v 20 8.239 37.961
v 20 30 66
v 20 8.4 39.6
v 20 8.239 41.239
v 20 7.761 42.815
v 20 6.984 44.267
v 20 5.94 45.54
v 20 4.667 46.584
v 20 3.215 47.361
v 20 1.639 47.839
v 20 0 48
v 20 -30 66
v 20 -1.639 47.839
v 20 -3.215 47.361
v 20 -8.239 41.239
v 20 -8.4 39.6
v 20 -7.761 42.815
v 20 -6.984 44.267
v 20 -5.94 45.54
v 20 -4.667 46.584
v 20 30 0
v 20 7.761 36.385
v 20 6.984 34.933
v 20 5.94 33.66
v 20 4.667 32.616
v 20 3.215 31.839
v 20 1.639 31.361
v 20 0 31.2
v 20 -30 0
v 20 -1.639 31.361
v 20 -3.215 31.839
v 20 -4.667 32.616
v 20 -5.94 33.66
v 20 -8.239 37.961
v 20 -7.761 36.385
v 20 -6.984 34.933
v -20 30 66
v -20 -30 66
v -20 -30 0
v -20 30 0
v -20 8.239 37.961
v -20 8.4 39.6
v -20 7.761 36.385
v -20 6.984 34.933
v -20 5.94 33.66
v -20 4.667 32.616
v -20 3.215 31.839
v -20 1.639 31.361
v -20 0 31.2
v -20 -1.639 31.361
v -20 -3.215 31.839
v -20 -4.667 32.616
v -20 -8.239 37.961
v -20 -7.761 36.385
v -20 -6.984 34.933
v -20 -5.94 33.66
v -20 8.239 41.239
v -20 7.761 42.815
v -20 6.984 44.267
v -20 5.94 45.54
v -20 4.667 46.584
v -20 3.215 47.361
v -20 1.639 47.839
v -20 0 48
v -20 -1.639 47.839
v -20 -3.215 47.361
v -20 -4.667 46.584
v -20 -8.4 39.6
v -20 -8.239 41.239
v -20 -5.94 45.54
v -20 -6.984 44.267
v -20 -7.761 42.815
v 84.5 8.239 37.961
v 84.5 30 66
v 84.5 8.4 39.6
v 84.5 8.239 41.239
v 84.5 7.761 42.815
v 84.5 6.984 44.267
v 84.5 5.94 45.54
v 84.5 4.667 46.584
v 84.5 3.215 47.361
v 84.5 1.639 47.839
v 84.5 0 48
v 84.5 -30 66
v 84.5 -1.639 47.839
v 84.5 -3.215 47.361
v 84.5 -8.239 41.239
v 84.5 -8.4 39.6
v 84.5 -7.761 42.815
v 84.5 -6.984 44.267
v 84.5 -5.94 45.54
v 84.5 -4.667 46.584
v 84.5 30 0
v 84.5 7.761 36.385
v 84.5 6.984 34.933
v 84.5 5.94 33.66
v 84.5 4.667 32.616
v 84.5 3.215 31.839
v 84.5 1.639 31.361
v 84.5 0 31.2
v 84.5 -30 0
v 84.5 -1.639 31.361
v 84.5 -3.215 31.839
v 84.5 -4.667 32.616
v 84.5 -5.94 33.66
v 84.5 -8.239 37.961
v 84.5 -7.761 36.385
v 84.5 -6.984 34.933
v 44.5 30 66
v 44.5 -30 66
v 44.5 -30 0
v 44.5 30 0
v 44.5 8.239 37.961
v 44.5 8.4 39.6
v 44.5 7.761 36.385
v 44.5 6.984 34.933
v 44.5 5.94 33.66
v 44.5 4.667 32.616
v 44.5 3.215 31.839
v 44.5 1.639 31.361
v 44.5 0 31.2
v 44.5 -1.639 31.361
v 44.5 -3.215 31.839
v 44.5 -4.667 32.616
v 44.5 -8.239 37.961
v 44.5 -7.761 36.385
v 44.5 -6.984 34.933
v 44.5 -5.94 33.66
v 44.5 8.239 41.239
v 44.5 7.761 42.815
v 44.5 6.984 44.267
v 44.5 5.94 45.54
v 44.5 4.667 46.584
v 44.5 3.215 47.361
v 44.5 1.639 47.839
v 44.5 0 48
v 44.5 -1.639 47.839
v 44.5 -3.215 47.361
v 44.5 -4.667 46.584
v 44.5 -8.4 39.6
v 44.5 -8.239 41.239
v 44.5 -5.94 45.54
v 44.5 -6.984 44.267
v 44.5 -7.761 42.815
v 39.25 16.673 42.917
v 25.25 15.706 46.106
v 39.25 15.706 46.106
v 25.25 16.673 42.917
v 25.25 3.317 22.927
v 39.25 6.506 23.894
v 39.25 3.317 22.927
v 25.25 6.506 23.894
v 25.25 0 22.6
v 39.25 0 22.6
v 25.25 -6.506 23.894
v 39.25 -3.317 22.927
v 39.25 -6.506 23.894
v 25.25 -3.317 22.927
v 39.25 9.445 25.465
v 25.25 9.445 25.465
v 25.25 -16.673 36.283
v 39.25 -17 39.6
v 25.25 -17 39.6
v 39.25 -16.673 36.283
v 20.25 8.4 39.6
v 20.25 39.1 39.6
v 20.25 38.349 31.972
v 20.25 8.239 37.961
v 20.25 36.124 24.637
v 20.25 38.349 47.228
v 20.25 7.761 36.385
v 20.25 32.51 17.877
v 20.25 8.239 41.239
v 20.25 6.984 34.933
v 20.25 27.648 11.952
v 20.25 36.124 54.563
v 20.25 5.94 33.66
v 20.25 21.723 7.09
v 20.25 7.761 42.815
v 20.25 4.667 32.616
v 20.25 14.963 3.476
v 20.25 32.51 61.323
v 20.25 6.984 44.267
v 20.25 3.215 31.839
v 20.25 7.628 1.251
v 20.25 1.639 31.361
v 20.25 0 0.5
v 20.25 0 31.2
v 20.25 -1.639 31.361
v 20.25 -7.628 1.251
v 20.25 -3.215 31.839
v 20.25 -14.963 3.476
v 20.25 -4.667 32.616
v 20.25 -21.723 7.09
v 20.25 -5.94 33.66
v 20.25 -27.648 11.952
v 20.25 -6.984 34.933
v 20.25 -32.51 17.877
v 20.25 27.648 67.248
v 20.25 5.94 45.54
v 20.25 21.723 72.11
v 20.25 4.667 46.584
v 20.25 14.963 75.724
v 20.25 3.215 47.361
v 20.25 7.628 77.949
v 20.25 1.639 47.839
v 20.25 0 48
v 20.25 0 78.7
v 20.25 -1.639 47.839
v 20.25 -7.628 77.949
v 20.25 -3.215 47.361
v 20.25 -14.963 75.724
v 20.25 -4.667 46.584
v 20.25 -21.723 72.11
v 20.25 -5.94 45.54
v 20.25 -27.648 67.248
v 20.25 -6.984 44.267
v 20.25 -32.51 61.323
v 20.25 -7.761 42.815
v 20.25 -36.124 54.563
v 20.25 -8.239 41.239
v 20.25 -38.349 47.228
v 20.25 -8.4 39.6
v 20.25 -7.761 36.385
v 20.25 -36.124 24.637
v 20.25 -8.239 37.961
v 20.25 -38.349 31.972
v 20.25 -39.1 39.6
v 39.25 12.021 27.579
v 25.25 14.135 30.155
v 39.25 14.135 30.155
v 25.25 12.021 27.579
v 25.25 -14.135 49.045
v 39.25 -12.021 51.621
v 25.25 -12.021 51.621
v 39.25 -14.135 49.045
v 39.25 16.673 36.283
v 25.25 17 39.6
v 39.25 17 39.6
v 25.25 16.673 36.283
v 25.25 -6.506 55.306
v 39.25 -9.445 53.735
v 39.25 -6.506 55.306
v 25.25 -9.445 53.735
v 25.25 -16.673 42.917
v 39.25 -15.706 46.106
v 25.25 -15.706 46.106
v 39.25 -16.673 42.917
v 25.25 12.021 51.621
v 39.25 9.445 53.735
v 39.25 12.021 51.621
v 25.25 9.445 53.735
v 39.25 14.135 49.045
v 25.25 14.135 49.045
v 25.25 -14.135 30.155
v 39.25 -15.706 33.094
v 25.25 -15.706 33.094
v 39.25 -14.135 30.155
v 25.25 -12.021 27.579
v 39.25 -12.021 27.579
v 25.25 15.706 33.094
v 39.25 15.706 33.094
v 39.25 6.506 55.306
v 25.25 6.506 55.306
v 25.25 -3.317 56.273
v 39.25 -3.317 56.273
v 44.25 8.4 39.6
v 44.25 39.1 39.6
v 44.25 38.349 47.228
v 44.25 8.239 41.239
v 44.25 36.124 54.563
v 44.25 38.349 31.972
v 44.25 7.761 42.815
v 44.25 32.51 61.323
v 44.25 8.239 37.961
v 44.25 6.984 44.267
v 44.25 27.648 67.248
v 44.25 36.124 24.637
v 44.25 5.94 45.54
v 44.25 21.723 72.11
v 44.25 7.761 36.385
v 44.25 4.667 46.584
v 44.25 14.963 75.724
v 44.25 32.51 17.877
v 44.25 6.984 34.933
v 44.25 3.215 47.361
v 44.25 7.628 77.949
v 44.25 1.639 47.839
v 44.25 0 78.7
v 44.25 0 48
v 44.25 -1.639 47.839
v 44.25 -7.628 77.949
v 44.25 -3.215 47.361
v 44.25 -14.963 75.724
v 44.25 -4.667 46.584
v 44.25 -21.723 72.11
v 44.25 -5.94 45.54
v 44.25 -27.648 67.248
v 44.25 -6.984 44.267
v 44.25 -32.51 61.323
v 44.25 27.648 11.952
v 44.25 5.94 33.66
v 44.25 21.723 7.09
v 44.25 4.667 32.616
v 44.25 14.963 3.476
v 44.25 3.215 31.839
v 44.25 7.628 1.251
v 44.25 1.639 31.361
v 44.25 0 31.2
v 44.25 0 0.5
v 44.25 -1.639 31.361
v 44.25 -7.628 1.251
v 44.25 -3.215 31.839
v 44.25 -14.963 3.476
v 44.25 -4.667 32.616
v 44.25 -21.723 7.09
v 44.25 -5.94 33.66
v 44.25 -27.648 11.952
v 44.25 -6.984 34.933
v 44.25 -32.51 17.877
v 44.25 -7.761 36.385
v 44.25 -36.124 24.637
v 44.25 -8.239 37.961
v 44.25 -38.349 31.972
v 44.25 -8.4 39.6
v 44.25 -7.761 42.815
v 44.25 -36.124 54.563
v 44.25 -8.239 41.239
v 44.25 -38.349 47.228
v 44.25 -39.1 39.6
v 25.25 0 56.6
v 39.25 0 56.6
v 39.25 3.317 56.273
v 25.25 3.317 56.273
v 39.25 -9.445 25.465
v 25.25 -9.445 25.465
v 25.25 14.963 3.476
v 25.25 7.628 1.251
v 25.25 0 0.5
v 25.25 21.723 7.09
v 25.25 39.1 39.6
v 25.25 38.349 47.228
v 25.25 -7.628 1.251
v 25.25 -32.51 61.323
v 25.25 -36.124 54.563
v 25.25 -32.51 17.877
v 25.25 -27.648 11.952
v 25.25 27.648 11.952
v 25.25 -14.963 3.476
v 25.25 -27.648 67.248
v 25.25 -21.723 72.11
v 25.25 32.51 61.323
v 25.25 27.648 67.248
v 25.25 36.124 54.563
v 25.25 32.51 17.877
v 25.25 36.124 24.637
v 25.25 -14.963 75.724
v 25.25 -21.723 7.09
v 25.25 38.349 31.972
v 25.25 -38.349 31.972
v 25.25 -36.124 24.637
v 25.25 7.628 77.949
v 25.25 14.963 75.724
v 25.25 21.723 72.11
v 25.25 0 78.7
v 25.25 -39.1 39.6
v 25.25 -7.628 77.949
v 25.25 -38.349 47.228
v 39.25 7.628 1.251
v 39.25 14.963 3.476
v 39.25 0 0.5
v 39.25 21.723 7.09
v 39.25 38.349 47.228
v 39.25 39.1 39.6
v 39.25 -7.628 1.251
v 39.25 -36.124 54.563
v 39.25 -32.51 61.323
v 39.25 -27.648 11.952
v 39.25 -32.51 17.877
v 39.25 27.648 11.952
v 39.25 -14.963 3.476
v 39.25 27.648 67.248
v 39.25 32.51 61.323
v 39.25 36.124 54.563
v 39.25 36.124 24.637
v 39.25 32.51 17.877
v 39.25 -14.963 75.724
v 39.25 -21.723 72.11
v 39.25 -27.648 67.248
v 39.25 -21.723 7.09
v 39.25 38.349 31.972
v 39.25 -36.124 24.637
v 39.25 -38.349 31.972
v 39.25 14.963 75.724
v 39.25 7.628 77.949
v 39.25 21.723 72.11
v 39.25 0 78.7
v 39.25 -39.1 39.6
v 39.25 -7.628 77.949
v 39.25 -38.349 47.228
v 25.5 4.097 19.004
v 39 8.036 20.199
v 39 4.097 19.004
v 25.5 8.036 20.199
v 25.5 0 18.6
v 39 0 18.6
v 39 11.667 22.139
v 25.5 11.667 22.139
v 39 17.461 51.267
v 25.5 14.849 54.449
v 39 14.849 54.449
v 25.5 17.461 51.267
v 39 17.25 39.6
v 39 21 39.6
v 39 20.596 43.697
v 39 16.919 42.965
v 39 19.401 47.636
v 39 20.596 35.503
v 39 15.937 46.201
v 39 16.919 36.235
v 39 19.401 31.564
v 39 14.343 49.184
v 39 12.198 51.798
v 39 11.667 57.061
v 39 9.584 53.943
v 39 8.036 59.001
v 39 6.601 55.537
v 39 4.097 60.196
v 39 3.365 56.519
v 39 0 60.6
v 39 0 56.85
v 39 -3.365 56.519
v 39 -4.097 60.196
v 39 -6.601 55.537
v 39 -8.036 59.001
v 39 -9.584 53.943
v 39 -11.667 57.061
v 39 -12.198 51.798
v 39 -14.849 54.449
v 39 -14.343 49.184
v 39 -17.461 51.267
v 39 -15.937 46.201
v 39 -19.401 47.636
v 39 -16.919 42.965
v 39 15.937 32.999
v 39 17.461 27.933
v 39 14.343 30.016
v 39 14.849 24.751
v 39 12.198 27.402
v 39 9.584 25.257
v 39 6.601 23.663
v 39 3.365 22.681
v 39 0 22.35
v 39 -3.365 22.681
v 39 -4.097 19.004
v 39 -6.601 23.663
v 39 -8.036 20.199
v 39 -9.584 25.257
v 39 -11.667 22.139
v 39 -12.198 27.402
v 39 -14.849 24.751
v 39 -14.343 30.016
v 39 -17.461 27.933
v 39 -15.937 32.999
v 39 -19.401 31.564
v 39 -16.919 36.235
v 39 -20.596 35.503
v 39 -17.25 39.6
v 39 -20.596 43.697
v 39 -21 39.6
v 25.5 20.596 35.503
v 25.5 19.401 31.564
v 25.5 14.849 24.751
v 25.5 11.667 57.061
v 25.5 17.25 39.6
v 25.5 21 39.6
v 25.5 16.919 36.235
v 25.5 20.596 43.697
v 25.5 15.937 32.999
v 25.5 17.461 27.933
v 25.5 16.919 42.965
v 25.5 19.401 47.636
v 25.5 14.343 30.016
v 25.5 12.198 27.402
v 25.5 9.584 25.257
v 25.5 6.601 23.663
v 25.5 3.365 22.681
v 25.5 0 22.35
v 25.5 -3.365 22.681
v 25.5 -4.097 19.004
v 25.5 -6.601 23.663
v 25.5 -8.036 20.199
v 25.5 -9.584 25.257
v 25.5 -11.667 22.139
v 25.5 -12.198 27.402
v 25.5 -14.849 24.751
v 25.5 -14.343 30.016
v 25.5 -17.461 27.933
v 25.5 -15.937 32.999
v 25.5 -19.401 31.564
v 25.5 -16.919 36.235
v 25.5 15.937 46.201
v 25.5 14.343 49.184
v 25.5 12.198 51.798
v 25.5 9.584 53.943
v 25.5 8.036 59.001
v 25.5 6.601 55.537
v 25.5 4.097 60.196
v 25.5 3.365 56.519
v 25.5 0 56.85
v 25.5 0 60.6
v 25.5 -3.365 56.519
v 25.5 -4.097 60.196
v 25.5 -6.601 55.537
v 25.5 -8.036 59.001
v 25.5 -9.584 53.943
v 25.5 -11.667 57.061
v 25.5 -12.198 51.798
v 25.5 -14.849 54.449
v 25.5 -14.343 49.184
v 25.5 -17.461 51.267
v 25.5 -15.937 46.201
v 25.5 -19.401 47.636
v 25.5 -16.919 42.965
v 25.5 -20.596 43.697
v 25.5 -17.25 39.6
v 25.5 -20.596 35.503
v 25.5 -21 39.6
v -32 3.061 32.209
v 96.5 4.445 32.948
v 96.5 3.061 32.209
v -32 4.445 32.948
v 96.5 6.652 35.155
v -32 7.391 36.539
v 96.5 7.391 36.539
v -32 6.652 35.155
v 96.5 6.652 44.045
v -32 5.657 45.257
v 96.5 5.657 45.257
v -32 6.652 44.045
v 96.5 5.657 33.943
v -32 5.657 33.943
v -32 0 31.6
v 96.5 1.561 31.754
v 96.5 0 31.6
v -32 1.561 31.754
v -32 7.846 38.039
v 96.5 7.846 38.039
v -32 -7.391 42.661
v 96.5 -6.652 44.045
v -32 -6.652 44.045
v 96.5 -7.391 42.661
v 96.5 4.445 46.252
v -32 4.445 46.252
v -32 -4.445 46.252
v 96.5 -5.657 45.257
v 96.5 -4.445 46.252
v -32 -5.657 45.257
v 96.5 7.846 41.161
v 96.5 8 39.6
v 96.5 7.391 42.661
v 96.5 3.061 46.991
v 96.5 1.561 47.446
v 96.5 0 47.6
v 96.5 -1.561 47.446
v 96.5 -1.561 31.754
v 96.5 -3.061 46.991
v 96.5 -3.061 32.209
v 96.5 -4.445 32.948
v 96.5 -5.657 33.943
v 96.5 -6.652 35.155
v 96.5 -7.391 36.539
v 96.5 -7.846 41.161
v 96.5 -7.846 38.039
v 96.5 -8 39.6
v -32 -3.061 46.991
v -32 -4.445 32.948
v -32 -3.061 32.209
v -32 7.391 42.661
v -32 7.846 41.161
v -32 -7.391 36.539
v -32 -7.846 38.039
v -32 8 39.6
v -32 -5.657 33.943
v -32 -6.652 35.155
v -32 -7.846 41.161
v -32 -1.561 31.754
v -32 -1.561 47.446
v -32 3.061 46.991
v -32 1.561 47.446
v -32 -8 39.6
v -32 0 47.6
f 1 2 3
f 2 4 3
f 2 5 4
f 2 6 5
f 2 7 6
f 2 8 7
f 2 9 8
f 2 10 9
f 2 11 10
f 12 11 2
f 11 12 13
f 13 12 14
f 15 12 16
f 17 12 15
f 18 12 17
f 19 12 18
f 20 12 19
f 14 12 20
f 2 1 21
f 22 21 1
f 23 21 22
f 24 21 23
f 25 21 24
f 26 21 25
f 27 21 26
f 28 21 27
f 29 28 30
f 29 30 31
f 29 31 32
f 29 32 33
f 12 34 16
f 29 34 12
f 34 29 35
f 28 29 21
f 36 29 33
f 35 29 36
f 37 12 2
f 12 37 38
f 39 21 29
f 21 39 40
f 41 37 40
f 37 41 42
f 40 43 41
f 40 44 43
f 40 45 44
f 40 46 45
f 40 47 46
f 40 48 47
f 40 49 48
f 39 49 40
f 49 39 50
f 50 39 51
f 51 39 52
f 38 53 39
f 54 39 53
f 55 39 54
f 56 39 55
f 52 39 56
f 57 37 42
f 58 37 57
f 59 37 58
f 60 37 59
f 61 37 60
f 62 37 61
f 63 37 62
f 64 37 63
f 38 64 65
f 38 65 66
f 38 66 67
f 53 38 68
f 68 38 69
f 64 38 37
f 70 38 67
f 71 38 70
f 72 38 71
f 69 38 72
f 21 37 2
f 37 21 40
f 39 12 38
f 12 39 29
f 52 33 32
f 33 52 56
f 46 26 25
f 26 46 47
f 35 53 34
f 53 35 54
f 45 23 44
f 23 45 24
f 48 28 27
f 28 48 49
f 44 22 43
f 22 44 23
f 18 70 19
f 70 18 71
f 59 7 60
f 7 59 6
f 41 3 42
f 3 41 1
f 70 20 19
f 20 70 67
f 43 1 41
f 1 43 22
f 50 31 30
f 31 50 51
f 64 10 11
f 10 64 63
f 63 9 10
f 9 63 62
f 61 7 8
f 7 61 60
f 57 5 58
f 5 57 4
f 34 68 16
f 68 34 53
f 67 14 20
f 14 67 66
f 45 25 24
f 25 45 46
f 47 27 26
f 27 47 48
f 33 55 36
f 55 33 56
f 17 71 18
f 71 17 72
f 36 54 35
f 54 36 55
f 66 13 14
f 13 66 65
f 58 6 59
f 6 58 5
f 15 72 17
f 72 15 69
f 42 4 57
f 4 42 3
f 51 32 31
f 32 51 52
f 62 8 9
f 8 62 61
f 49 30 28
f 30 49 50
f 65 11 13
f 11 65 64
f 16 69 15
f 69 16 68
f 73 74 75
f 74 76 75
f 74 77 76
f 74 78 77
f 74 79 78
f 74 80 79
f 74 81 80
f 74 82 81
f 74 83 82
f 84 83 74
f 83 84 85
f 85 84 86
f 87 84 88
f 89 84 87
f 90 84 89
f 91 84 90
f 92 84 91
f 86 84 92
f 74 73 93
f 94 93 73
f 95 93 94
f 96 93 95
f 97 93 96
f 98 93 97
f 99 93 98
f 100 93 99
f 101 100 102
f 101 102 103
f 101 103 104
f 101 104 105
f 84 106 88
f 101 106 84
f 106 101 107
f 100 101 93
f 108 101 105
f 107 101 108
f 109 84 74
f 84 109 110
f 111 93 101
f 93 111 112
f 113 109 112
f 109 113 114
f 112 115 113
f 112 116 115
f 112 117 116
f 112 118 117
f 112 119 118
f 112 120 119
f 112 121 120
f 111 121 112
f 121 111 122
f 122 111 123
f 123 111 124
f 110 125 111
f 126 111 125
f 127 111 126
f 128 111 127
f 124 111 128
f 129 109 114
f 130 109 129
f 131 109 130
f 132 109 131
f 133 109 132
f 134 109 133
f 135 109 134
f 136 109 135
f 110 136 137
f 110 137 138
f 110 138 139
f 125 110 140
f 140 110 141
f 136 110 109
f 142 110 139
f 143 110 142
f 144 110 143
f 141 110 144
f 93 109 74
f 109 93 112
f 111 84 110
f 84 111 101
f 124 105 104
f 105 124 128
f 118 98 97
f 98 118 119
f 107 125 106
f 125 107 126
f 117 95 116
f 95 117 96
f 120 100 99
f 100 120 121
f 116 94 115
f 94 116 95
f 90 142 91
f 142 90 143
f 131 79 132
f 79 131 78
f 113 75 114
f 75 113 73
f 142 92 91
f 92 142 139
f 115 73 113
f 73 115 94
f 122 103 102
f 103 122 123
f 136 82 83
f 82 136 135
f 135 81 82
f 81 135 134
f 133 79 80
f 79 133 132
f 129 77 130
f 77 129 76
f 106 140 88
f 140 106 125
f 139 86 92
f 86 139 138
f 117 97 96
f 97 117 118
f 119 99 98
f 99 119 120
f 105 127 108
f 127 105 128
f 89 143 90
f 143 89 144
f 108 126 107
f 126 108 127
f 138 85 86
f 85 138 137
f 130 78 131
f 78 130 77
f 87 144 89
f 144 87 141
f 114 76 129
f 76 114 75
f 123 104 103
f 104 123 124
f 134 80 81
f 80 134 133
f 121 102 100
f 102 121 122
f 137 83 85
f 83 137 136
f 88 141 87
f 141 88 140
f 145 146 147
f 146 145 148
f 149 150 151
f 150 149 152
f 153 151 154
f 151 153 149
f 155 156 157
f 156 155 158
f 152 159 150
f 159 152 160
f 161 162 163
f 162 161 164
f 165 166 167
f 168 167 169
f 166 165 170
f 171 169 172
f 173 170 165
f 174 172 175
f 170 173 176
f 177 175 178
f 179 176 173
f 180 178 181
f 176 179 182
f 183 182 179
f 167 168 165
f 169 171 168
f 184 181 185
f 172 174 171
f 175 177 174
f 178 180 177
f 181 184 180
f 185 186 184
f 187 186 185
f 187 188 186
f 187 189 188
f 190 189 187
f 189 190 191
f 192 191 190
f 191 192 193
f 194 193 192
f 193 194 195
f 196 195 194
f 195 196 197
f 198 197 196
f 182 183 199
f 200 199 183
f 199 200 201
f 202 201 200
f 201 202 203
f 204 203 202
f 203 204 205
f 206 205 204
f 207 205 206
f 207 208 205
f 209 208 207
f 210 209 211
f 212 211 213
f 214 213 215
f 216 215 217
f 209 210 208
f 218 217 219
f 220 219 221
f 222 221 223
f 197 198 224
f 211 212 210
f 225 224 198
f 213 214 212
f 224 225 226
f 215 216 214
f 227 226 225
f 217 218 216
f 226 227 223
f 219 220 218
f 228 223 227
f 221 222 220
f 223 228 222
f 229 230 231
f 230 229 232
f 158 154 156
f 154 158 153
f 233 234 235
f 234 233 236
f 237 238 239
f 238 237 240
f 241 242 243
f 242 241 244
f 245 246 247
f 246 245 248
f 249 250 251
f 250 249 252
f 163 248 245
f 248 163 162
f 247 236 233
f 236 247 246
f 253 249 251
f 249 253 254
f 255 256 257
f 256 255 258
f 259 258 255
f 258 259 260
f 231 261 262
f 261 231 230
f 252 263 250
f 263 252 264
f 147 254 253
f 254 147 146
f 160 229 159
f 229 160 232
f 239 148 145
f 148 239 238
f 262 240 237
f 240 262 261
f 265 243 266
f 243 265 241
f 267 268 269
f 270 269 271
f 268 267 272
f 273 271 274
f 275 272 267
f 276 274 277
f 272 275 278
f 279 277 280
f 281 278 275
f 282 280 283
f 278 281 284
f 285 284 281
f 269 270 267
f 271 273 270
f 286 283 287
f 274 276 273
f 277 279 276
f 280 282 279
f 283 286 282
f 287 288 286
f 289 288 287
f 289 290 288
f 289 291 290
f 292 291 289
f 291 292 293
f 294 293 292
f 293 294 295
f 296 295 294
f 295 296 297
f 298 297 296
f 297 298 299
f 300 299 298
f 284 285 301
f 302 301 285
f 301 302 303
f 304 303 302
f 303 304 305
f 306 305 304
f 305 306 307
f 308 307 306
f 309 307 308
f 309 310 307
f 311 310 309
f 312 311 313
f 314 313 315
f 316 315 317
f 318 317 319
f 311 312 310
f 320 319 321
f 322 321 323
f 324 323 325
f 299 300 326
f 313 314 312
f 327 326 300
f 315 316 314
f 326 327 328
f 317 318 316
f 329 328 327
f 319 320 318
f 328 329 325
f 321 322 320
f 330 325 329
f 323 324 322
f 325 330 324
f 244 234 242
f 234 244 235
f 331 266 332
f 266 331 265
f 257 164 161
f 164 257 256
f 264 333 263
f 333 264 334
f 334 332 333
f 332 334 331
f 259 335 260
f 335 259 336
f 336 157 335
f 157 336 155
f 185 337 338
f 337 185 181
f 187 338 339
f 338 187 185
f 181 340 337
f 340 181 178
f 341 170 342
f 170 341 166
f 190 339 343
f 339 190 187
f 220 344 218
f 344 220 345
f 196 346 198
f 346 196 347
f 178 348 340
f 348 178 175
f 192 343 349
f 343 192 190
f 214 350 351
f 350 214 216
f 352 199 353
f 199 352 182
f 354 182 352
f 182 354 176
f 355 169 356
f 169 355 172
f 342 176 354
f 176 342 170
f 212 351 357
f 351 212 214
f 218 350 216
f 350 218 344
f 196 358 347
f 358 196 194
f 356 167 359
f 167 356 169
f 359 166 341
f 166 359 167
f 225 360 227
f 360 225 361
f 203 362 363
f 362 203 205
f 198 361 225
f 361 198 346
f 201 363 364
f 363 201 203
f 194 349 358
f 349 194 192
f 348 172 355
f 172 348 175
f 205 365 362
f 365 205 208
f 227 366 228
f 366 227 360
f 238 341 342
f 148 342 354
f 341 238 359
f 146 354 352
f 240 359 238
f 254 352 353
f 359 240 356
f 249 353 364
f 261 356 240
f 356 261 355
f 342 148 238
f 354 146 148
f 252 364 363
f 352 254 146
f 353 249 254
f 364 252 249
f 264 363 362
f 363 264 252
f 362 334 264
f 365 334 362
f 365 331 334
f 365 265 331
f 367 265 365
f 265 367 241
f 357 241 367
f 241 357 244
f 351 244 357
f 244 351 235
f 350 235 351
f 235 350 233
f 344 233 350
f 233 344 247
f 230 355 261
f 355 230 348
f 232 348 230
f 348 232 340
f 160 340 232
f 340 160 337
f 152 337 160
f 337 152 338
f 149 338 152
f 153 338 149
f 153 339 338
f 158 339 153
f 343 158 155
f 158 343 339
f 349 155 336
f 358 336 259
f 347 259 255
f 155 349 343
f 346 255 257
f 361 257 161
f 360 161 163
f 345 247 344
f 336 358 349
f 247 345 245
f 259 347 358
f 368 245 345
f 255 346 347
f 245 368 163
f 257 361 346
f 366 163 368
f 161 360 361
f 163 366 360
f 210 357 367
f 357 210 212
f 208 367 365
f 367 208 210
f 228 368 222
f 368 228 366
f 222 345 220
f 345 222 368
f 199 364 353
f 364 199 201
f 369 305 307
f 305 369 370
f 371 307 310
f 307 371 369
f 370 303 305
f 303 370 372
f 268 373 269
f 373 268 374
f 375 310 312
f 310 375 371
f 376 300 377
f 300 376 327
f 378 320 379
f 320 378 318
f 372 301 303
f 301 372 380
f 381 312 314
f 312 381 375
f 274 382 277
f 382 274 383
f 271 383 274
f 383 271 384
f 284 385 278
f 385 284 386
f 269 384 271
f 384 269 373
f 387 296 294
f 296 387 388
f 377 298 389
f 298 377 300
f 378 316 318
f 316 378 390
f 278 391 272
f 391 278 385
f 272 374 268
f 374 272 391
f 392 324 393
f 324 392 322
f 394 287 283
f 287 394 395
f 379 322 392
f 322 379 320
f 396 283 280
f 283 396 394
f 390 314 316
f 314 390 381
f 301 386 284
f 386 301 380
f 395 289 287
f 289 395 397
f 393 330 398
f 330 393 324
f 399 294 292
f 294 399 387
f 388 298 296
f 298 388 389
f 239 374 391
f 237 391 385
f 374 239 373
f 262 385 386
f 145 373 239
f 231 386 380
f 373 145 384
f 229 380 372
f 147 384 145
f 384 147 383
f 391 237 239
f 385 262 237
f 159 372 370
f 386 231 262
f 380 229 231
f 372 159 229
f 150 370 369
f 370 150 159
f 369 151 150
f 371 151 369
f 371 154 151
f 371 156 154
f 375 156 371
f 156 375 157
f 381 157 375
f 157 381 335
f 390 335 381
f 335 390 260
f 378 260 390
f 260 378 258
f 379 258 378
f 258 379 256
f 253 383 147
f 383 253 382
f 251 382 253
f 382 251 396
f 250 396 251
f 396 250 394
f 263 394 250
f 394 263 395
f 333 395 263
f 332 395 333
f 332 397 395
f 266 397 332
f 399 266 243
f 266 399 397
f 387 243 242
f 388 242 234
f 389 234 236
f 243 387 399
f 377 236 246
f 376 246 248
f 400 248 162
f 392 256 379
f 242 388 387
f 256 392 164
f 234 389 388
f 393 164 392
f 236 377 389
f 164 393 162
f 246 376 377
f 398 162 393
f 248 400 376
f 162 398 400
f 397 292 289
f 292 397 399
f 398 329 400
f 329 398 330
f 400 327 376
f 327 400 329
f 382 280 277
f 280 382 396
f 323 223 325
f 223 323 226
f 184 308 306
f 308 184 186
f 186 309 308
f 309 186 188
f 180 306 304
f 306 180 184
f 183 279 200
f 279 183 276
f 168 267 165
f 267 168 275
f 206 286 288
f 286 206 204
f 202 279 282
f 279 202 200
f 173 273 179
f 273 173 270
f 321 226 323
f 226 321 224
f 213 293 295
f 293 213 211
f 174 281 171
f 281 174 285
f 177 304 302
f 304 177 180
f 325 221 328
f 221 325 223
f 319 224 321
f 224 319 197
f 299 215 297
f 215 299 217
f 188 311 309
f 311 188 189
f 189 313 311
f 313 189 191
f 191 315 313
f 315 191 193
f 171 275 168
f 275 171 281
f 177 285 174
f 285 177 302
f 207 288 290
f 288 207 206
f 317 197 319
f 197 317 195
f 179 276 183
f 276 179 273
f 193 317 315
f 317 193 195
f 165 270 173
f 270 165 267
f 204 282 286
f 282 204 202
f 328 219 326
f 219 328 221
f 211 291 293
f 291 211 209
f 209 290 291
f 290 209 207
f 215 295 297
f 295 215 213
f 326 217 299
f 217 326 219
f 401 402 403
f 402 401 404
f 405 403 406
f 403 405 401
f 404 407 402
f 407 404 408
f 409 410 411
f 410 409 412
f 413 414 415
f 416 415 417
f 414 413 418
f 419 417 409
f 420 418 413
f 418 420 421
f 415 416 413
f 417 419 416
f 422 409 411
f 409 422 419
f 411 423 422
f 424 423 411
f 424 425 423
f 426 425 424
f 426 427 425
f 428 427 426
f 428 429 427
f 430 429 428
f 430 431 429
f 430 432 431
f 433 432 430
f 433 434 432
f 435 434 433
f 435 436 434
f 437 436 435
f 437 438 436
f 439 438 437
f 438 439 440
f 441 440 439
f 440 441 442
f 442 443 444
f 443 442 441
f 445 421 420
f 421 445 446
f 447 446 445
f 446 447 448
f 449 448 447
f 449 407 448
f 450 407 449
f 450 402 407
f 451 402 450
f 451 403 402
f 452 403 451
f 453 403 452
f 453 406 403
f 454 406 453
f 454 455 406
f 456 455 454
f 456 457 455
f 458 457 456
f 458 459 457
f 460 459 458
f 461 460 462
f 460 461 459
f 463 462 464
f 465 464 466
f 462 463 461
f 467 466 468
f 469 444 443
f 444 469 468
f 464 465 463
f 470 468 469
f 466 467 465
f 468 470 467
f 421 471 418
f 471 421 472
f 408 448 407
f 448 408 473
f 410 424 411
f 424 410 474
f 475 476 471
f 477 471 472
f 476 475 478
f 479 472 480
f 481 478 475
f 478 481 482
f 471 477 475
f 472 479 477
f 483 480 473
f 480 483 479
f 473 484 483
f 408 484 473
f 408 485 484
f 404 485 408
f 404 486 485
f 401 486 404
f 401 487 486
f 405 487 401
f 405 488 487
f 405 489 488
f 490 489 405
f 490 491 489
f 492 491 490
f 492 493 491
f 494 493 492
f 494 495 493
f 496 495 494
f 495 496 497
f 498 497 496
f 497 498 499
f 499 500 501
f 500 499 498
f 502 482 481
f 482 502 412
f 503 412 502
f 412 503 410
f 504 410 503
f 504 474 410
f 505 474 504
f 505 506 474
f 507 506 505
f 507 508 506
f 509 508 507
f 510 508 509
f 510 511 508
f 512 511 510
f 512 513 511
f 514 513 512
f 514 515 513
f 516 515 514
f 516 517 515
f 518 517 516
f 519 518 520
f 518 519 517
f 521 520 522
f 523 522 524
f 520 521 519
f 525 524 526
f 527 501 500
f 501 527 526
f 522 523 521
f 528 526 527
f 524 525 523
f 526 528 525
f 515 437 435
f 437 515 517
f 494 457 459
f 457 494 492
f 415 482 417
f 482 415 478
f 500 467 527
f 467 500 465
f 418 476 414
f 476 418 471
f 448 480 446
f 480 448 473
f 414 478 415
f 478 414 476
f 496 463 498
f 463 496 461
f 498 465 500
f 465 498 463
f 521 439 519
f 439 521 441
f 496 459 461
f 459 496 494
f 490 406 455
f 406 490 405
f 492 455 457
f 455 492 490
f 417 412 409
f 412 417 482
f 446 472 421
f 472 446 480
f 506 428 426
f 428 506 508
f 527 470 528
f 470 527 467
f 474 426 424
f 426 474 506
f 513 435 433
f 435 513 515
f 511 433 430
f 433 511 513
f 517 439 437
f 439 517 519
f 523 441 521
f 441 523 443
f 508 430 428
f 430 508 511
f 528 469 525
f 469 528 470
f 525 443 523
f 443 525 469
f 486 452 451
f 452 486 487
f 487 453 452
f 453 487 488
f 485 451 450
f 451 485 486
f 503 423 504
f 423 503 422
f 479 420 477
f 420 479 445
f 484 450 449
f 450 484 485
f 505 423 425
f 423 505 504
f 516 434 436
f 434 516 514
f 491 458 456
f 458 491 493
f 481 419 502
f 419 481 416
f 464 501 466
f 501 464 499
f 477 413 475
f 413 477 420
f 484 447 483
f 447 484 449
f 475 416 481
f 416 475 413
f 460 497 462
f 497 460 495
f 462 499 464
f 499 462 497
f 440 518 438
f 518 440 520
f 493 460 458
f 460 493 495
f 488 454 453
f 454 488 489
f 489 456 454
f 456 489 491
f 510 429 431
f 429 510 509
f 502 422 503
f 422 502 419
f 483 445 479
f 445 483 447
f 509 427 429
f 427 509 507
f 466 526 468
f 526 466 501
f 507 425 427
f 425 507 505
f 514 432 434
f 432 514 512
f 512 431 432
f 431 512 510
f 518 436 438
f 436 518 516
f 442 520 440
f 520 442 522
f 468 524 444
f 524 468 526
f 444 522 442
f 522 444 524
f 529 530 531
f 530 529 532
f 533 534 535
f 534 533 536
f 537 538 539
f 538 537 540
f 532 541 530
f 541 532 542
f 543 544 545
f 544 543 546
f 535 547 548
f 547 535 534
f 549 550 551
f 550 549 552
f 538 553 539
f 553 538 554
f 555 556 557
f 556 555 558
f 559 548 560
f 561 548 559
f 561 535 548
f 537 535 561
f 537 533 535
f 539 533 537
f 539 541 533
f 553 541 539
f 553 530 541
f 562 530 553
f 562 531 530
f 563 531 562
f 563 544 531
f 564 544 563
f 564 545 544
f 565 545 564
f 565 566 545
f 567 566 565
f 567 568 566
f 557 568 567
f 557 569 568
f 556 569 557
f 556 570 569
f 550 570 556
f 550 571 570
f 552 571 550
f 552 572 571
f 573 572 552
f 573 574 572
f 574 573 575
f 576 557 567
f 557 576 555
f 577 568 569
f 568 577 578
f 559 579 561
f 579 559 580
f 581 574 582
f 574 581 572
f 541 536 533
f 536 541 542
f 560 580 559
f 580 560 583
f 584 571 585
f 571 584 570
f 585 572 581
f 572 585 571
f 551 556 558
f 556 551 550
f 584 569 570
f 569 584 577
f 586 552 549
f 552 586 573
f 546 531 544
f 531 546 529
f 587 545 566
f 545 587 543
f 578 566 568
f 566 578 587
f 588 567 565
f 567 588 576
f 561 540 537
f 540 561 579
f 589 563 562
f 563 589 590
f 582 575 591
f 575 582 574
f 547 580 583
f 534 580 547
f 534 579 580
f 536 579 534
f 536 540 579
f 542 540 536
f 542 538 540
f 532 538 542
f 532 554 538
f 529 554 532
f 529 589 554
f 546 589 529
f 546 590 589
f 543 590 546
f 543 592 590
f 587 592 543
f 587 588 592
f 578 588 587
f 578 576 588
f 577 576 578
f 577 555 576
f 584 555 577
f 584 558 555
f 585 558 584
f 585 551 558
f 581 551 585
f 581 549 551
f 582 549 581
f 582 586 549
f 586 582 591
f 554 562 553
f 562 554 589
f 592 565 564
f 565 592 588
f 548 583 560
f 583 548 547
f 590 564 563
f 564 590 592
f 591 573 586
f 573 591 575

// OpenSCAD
$fn = 32;

// ------------------------------------------------------------------------
// Pulley assembly: d78.2 pulley with a belt, shaft d16
// Every part is its own module, assembly() places them once.
// ------------------------------------------------------------------------

// --- part 1 ---
module support1() {
  difference() {
    translate([-20, -30, 0]) cube([40, 60, 66]);
    translate([0, 0, 39.6]) rotate([0, 90, 0]) cylinder(h = 42, d = 16.8, center = true);
  }
}

// --- part 2 ---
module support2() {
  difference() {
    translate([-20, -30, 0]) cube([40, 60, 66]);
    translate([0, 0, 39.6]) rotate([0, 90, 0]) cylinder(h = 42, d = 16.8, center = true);
  }
}

// --- part 3 ---
module shaft() {
  translate([0, 0, -64.25]) cylinder(h = 128.5, d = 16);
}

// --- part 4 ---
module pulley() {
  difference() {
    union() {
      cylinder(h = 24, d = 34);
      cylinder(h = 5, d = 78.2);
      translate([0, 0, 19]) cylinder(h = 5, d = 78.2);
    }
    translate([0, 0, -1]) cylinder(h = 26, d = 16.8);
  }
}

// --- part 5 ---
module belt() {
  difference() {
      translate([0, 0, 0]) cylinder(h = 13.5, d = 42);
      translate([0, 0, -1]) cylinder(h = 15.5, d = 34.5);
    }
}

// --- assembly ---
module assembly() {
  translate([0, 0, 0]) rotate([0, 0, 0]) support1();
  translate([64.5, 0, 0]) rotate([0, 0, 0]) support2();
  translate([32.25, 0, 39.6]) rotate([0, 90, 0]) shaft();
  translate([20.25, 0, 39.6]) rotate([0, 90, 0]) pulley();
  translate([25.5, 0, 39.6]) rotate([0, 90, 0]) belt();
}

assembly();
